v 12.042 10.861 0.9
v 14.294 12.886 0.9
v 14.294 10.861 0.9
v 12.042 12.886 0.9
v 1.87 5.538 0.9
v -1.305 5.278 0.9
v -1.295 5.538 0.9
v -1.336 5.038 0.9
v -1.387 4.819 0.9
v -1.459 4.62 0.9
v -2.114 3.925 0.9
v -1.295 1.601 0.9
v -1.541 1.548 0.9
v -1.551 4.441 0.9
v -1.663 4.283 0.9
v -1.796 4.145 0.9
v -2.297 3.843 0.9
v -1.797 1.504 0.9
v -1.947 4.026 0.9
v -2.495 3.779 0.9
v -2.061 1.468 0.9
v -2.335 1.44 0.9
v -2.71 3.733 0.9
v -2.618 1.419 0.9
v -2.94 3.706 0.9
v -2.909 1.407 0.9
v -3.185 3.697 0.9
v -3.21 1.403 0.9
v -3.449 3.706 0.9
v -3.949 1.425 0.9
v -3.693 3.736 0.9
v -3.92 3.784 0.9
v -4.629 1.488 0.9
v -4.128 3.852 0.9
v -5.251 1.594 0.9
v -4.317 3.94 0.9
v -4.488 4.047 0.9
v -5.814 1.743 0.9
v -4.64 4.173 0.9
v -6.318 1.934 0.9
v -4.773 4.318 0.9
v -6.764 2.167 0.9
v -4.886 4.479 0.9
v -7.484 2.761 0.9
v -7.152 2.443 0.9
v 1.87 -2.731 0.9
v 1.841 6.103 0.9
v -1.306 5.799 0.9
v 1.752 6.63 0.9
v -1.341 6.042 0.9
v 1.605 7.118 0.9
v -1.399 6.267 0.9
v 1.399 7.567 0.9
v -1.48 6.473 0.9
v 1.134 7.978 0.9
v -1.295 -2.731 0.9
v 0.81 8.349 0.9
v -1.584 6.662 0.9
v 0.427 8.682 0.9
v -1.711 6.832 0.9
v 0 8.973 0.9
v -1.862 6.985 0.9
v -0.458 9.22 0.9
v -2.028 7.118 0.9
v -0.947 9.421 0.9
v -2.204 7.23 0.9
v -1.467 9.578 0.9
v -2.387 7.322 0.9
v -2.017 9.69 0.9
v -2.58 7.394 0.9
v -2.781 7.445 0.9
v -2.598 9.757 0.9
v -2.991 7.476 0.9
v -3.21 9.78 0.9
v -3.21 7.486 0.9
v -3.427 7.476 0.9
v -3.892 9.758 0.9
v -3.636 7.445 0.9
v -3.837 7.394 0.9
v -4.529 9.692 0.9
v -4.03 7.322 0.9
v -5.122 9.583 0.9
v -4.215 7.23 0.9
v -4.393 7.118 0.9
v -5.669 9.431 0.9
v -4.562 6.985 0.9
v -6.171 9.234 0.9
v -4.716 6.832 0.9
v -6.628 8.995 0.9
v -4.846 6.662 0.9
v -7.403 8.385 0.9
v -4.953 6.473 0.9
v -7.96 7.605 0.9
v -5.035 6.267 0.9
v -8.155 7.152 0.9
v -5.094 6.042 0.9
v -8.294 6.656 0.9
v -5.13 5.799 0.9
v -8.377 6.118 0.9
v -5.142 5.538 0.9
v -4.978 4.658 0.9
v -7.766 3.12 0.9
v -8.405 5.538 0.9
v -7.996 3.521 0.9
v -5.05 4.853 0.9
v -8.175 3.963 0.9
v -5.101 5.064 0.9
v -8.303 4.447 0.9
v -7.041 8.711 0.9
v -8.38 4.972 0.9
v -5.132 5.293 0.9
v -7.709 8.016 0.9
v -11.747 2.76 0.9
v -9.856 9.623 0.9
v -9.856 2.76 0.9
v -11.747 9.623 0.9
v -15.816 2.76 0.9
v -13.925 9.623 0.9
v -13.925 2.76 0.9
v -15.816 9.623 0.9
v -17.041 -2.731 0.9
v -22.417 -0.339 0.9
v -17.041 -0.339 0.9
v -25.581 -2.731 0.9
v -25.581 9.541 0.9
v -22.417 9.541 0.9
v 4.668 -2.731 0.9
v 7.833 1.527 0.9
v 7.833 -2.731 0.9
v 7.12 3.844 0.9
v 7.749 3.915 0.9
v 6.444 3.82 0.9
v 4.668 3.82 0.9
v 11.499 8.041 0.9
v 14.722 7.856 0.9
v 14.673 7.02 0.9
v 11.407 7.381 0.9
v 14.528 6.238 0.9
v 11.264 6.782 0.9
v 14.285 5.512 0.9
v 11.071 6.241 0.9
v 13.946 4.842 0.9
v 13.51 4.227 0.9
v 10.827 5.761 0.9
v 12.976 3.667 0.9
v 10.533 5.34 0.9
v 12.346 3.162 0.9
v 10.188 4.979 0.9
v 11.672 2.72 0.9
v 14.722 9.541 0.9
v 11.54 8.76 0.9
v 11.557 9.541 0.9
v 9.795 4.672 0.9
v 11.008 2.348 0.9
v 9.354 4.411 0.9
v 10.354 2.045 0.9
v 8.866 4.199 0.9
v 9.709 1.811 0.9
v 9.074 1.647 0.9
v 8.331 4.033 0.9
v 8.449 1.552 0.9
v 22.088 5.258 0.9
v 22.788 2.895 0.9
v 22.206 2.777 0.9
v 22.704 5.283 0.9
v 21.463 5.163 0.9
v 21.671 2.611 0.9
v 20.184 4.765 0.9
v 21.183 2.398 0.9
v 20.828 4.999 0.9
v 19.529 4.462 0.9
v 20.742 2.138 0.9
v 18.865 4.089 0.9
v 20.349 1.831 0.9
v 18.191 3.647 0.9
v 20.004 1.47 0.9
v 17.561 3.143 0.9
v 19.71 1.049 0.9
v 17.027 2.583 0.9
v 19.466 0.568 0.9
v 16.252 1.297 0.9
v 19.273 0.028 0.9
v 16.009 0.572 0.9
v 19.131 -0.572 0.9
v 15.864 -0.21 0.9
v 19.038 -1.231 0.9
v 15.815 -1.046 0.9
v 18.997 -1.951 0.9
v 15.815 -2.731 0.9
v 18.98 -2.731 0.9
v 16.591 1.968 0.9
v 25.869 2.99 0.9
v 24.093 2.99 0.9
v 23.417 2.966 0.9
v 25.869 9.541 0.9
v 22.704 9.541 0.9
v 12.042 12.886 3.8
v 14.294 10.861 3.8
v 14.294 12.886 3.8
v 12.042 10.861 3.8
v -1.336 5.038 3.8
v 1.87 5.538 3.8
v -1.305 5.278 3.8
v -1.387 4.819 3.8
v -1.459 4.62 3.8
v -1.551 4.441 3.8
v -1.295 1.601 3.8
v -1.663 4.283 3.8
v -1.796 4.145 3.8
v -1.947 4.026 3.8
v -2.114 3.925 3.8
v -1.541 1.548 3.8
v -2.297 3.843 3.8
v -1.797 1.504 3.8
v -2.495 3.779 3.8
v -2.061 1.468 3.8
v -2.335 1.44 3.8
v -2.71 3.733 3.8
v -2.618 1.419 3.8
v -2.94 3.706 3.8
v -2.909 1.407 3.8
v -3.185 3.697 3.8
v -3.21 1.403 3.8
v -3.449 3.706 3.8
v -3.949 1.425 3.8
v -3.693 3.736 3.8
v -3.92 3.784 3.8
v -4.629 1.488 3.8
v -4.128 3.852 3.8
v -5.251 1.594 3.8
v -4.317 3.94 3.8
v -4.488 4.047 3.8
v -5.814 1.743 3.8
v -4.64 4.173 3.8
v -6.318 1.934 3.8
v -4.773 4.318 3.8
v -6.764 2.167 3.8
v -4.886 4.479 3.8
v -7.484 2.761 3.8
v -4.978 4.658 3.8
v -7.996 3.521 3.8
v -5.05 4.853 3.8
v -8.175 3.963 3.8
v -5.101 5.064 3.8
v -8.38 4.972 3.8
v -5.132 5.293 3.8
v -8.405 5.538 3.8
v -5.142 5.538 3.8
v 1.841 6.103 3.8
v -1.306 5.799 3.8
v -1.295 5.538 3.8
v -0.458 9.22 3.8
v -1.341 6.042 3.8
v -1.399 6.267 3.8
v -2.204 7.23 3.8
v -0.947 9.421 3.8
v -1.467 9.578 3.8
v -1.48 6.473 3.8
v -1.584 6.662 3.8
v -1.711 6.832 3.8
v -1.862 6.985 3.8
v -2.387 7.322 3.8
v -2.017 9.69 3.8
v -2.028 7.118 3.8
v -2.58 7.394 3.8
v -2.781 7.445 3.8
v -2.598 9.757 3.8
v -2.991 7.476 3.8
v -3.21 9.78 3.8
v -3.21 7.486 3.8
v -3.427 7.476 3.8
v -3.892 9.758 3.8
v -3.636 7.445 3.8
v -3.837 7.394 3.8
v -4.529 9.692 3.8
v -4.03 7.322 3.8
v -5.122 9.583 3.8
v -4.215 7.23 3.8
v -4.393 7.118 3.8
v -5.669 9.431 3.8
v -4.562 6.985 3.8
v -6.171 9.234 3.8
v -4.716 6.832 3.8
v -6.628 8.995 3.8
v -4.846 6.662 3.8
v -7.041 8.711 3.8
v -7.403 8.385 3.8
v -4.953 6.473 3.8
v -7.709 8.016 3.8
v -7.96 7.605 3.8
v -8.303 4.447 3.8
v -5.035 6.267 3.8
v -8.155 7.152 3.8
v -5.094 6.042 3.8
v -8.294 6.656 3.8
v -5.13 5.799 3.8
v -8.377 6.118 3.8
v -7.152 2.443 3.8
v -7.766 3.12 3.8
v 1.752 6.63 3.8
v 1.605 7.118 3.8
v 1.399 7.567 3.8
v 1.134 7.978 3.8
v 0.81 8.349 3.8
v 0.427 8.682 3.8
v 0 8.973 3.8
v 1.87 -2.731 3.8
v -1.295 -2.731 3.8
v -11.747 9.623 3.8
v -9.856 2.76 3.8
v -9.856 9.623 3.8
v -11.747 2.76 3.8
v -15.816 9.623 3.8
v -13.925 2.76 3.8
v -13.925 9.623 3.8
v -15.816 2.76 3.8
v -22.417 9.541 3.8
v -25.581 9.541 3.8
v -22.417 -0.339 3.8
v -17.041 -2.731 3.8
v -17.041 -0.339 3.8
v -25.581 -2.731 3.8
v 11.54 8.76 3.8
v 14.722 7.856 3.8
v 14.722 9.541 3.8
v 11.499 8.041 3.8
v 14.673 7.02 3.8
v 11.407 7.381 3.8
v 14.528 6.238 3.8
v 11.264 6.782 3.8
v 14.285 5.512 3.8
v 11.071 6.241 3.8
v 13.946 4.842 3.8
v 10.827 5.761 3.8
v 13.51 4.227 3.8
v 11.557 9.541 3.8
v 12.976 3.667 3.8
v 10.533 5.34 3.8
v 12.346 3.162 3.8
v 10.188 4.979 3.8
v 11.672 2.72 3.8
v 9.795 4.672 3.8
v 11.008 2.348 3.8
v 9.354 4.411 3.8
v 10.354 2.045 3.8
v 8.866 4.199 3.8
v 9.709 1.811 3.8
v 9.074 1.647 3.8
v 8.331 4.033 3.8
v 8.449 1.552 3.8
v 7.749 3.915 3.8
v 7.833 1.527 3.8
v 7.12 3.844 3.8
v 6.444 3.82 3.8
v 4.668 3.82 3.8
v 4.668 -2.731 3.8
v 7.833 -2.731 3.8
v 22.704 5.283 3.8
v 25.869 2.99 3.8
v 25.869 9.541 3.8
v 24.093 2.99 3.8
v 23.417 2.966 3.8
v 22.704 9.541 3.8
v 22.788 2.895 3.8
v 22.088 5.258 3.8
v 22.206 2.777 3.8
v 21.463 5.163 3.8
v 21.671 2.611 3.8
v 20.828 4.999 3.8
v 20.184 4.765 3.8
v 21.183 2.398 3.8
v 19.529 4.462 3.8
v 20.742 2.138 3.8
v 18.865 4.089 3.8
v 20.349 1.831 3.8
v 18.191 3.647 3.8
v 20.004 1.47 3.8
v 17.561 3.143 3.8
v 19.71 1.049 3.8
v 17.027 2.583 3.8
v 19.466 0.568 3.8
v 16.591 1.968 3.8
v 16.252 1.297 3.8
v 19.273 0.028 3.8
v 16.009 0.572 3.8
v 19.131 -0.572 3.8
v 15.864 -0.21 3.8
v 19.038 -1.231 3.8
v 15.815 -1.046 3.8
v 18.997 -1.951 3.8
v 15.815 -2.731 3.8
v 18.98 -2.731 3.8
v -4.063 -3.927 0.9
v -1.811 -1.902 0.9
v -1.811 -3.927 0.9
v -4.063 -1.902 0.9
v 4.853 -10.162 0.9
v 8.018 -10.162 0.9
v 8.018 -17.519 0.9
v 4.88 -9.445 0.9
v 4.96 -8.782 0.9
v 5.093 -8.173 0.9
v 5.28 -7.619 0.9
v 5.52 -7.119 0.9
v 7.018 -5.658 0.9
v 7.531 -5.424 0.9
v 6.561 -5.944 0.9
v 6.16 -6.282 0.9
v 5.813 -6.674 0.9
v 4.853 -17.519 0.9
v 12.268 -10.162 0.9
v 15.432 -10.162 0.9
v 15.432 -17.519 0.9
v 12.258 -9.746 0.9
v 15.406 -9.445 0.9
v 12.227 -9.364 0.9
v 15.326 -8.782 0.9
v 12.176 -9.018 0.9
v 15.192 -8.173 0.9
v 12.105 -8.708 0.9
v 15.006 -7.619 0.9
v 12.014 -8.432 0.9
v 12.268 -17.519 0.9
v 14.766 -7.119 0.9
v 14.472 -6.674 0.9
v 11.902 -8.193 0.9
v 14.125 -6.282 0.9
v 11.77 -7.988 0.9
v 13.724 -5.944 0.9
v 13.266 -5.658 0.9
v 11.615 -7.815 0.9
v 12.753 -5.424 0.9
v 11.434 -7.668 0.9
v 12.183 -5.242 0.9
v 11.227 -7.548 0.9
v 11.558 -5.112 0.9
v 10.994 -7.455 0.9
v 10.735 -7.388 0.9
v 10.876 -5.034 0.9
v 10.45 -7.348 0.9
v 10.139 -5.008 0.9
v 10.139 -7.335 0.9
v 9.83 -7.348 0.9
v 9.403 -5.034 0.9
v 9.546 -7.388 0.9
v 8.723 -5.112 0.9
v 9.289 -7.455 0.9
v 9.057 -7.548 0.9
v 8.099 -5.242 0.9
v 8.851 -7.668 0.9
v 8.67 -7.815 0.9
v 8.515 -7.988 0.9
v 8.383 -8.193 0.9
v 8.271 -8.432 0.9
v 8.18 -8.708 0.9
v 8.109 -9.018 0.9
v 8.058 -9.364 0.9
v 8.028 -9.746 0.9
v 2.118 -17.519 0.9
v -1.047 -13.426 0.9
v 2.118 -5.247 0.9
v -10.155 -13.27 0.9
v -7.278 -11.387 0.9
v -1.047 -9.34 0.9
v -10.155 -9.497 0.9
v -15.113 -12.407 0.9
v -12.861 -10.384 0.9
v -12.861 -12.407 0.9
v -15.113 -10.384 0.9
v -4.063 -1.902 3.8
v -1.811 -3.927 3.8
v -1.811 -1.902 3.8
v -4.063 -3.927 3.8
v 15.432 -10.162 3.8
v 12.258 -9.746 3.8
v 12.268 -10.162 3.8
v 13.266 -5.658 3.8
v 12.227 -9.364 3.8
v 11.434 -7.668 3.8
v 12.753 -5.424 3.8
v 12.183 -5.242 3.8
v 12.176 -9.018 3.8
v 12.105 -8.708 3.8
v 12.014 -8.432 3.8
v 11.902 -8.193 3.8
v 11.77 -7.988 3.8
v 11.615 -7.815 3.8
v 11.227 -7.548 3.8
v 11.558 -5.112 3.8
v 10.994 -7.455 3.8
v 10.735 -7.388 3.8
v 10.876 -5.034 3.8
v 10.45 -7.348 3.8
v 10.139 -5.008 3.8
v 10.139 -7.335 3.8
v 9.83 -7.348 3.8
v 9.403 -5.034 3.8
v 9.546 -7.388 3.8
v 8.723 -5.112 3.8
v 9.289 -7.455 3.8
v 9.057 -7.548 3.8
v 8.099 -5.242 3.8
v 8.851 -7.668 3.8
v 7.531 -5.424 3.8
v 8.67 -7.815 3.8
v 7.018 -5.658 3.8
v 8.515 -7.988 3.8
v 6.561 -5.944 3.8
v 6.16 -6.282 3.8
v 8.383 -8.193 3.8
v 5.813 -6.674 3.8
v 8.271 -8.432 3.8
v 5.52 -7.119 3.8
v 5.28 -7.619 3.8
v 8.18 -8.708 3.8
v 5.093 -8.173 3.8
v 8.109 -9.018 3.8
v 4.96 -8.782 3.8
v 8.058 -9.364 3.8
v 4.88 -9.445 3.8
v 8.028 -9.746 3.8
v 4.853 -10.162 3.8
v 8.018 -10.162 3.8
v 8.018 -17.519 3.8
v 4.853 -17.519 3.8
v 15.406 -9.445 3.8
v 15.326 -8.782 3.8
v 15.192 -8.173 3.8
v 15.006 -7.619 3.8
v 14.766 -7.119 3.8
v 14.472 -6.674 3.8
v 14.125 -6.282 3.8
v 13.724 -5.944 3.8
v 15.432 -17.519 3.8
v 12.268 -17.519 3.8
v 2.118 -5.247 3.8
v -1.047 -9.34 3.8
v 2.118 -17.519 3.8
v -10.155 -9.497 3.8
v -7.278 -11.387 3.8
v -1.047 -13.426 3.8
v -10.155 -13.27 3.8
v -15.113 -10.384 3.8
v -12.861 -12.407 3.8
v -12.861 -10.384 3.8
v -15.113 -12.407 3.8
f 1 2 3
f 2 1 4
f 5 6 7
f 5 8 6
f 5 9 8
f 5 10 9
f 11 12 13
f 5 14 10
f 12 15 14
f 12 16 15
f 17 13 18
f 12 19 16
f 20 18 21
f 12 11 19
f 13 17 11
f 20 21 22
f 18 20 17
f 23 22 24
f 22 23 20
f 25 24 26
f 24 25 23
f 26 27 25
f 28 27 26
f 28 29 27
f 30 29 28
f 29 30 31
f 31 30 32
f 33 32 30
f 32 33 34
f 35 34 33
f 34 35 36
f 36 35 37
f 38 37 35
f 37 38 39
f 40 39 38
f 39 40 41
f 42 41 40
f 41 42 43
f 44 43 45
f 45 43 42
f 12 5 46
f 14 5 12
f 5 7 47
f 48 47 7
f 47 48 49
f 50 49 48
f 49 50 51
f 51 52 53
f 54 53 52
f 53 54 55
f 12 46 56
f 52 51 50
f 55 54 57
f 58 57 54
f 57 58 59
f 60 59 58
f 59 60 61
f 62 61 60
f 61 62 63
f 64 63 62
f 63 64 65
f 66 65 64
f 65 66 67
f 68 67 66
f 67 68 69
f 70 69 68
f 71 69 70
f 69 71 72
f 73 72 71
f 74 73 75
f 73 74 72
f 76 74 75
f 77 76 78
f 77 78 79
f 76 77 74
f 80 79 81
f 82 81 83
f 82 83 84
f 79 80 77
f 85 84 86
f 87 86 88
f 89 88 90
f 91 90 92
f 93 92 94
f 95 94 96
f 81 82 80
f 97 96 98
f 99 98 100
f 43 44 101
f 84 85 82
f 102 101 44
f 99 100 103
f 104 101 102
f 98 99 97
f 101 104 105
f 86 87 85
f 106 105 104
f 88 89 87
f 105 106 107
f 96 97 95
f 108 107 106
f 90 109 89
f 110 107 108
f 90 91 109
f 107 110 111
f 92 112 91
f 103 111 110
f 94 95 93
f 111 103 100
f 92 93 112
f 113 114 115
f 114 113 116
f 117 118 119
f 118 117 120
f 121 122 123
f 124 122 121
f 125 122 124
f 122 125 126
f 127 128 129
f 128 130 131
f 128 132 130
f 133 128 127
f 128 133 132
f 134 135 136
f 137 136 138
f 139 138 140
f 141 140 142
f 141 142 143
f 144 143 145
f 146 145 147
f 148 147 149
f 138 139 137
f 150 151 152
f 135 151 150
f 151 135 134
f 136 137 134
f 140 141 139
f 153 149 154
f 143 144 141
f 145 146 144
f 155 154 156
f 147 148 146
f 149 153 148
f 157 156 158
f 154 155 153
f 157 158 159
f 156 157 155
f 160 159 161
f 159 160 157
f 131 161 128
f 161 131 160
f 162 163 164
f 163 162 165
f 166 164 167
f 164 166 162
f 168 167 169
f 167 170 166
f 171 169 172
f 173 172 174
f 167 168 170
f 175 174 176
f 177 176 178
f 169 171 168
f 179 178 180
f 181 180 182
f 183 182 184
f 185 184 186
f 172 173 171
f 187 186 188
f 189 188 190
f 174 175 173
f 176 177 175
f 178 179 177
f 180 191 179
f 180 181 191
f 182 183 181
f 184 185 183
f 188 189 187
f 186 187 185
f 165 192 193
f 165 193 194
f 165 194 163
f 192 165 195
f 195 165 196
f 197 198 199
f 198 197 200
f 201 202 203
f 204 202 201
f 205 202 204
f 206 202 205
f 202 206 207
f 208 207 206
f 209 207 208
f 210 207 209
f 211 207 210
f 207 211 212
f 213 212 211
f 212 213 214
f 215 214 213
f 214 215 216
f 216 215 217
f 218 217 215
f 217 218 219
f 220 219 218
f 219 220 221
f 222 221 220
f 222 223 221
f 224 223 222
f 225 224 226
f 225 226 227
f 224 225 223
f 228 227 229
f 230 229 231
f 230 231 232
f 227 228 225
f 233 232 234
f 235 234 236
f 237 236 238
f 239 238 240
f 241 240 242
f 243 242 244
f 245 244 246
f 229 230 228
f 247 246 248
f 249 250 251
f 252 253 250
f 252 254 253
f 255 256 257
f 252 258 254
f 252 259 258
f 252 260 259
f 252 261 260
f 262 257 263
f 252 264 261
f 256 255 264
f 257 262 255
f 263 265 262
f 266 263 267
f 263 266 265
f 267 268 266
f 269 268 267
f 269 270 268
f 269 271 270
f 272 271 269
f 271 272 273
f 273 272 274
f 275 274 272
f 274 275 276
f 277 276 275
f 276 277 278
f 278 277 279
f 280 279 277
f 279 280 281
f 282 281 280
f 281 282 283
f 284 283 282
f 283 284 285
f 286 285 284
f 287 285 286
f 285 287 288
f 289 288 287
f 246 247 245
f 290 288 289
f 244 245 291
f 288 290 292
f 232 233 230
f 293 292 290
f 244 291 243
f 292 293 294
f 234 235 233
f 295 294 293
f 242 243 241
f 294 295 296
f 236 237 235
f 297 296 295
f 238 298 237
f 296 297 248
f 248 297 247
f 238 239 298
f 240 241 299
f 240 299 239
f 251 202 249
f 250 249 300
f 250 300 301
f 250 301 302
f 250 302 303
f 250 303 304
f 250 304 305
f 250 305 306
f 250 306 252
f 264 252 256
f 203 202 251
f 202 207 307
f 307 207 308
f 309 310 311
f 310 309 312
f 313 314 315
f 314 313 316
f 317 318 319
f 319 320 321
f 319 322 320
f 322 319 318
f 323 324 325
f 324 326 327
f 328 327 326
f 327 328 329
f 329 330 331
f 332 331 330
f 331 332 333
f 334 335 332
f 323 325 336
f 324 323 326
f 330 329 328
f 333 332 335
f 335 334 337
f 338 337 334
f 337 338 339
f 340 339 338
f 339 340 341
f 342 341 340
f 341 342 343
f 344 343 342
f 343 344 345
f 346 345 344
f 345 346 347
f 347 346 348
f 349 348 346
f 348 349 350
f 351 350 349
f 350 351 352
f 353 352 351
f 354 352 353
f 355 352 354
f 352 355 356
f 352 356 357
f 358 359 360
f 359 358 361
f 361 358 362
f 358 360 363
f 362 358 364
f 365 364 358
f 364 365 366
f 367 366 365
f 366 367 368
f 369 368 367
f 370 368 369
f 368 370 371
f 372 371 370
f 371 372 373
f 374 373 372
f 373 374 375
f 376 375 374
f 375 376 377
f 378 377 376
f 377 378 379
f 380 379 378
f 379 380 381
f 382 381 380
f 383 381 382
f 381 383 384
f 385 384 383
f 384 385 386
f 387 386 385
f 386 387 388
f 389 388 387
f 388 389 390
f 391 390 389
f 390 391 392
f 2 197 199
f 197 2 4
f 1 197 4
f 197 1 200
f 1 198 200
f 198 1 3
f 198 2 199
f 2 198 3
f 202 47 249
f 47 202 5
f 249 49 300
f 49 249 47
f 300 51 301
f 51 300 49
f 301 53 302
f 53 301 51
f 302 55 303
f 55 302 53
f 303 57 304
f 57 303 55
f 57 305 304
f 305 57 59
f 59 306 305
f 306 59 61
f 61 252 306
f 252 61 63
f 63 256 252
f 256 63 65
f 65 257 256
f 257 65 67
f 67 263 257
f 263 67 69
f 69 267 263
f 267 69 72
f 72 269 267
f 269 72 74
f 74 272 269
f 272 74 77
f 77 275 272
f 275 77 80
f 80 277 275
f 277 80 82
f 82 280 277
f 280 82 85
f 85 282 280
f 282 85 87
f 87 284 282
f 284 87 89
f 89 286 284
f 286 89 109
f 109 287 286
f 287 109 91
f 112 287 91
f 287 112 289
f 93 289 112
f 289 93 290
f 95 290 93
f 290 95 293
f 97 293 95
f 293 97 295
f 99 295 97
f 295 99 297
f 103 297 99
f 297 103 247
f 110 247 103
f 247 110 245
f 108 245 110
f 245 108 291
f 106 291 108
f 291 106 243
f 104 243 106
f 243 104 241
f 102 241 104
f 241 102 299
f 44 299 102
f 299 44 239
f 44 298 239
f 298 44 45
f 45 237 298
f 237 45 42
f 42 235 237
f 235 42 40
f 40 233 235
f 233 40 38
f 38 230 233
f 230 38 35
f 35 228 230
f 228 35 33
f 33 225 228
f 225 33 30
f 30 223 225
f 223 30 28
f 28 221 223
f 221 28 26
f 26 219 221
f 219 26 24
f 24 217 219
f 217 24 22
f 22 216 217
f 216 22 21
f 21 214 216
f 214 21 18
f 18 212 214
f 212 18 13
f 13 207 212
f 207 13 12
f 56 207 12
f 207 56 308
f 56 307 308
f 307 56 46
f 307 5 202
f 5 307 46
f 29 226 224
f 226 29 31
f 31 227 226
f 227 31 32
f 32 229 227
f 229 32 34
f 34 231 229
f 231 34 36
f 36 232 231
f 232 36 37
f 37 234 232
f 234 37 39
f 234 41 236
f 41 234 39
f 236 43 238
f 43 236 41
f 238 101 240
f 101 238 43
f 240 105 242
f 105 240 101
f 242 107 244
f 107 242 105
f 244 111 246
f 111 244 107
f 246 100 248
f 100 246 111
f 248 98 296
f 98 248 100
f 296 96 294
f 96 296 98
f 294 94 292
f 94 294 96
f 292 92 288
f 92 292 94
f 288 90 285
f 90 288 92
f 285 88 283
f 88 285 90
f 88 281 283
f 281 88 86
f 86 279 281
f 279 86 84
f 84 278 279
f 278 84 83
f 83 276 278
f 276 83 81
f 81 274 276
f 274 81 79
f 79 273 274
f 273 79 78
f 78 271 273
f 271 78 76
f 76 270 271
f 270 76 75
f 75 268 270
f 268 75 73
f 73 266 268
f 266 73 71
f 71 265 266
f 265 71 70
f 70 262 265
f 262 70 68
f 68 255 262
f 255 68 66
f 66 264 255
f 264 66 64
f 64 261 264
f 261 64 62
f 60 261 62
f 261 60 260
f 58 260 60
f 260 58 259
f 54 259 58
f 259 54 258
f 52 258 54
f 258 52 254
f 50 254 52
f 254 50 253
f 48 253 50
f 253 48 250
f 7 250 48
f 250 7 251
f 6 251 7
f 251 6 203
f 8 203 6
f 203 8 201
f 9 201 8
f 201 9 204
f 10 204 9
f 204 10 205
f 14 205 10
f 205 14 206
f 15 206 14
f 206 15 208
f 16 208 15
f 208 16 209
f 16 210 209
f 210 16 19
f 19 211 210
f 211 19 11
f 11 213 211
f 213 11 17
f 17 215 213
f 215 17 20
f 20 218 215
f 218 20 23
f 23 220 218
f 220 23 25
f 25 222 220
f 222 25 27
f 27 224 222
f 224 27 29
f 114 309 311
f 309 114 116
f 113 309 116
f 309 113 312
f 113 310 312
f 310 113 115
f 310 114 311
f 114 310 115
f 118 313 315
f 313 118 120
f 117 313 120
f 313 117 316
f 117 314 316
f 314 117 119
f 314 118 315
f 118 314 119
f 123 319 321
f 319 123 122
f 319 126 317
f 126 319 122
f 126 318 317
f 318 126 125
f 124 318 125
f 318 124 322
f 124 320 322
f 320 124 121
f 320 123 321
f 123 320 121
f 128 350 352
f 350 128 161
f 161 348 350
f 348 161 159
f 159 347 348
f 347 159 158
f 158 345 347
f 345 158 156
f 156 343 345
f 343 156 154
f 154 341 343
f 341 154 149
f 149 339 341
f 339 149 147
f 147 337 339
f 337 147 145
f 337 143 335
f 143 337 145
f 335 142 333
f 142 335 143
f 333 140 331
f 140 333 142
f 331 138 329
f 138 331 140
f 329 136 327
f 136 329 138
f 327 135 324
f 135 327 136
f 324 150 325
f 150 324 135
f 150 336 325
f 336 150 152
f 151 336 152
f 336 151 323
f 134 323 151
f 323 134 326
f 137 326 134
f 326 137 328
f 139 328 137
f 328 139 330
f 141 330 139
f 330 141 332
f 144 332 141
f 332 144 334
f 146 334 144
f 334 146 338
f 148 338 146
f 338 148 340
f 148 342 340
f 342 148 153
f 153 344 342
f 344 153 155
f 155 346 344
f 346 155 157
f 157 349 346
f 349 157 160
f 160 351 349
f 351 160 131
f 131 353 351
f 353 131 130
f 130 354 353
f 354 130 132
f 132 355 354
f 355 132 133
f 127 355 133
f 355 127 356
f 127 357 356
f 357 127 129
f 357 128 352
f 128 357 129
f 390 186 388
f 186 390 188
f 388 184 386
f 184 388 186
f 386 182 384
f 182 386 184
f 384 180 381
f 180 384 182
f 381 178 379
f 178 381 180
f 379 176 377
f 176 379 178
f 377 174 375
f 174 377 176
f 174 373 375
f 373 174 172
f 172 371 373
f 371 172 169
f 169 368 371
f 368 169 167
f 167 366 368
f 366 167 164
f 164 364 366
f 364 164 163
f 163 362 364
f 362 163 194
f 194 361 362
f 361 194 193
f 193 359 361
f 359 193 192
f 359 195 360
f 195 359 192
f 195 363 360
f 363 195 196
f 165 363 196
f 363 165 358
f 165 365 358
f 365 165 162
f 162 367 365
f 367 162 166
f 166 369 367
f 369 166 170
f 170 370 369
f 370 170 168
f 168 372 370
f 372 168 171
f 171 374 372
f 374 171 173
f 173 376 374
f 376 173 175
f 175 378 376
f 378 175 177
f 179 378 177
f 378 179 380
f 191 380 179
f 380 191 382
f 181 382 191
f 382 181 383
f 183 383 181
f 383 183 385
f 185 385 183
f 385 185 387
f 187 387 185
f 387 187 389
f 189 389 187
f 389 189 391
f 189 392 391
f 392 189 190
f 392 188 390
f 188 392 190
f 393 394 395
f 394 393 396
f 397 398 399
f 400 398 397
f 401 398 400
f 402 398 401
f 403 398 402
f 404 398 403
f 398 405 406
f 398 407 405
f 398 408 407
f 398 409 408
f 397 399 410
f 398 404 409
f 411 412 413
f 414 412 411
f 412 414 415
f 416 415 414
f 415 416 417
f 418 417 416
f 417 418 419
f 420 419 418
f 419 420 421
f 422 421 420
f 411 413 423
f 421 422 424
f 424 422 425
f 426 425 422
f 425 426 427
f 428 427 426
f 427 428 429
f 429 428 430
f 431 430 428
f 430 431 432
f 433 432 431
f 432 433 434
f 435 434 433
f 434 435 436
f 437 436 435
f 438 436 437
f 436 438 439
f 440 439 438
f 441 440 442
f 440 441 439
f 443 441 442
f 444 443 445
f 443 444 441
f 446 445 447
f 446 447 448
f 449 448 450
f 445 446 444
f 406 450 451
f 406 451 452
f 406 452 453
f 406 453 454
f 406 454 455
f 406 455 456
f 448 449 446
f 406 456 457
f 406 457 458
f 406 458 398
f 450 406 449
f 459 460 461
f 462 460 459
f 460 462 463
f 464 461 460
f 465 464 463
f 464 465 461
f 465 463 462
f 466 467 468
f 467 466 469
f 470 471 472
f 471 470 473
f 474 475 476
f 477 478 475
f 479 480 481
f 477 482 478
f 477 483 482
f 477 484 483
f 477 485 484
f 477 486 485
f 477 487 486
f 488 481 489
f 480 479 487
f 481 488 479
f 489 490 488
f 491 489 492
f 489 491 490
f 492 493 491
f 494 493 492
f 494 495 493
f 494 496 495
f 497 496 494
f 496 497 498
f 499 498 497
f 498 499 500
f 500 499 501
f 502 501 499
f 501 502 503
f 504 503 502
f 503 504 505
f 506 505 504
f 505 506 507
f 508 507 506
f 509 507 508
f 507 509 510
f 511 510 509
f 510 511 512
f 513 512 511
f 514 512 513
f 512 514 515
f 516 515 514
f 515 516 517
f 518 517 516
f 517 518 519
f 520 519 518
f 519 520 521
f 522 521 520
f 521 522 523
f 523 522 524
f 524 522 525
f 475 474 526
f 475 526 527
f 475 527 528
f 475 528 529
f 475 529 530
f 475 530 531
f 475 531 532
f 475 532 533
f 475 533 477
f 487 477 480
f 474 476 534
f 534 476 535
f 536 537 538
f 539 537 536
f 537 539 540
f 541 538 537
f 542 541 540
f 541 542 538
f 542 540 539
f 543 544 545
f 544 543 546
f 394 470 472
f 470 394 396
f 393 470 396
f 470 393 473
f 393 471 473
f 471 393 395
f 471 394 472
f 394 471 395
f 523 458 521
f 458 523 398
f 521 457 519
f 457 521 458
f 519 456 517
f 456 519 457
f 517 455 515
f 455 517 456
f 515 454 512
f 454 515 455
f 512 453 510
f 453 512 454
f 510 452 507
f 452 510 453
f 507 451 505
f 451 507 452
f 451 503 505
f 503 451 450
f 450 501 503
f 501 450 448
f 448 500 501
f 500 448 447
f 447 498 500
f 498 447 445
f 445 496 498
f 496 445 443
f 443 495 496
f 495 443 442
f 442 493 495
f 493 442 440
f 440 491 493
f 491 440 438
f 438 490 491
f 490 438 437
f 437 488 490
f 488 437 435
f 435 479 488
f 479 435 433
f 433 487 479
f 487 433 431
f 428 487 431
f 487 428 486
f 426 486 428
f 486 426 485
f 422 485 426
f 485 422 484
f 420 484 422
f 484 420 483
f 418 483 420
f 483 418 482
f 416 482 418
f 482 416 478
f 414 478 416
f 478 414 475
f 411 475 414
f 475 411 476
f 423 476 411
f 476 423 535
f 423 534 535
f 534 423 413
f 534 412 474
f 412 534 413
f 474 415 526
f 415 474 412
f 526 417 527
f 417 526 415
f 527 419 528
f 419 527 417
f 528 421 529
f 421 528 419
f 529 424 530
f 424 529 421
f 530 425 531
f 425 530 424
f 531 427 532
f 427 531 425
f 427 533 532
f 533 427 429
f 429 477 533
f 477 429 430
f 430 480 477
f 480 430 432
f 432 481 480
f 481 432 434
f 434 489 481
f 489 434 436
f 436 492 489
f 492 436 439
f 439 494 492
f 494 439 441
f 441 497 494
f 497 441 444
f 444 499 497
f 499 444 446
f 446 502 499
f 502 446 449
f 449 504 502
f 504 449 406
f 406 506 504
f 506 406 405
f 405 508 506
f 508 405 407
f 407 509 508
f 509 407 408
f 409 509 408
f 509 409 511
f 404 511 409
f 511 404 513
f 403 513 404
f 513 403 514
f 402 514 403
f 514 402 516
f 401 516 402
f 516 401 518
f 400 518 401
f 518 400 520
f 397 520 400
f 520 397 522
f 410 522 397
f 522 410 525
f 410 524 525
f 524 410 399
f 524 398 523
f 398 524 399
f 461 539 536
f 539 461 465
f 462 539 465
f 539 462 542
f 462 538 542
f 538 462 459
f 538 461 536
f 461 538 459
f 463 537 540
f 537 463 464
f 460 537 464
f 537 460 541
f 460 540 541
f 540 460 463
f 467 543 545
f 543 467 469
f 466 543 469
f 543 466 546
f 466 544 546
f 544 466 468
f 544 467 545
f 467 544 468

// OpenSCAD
$fn = 48;
  // syllabics (overlaid on icon, tallest)
  translate([0, 4.894, 0.900]) linear_extrude(height=2.900) text("ᒪᐦᑫᓰᓱ", size=12.122, halign="center", valign="center", font="Euphemia UCAS:style=Bold");
  translate([0, -9.894, 0.900]) linear_extrude(height=2.900) text("ᐧᐋᑎ", size=12.122, halign="center", valign="center", font="Euphemia UCAS:style=Bold");
